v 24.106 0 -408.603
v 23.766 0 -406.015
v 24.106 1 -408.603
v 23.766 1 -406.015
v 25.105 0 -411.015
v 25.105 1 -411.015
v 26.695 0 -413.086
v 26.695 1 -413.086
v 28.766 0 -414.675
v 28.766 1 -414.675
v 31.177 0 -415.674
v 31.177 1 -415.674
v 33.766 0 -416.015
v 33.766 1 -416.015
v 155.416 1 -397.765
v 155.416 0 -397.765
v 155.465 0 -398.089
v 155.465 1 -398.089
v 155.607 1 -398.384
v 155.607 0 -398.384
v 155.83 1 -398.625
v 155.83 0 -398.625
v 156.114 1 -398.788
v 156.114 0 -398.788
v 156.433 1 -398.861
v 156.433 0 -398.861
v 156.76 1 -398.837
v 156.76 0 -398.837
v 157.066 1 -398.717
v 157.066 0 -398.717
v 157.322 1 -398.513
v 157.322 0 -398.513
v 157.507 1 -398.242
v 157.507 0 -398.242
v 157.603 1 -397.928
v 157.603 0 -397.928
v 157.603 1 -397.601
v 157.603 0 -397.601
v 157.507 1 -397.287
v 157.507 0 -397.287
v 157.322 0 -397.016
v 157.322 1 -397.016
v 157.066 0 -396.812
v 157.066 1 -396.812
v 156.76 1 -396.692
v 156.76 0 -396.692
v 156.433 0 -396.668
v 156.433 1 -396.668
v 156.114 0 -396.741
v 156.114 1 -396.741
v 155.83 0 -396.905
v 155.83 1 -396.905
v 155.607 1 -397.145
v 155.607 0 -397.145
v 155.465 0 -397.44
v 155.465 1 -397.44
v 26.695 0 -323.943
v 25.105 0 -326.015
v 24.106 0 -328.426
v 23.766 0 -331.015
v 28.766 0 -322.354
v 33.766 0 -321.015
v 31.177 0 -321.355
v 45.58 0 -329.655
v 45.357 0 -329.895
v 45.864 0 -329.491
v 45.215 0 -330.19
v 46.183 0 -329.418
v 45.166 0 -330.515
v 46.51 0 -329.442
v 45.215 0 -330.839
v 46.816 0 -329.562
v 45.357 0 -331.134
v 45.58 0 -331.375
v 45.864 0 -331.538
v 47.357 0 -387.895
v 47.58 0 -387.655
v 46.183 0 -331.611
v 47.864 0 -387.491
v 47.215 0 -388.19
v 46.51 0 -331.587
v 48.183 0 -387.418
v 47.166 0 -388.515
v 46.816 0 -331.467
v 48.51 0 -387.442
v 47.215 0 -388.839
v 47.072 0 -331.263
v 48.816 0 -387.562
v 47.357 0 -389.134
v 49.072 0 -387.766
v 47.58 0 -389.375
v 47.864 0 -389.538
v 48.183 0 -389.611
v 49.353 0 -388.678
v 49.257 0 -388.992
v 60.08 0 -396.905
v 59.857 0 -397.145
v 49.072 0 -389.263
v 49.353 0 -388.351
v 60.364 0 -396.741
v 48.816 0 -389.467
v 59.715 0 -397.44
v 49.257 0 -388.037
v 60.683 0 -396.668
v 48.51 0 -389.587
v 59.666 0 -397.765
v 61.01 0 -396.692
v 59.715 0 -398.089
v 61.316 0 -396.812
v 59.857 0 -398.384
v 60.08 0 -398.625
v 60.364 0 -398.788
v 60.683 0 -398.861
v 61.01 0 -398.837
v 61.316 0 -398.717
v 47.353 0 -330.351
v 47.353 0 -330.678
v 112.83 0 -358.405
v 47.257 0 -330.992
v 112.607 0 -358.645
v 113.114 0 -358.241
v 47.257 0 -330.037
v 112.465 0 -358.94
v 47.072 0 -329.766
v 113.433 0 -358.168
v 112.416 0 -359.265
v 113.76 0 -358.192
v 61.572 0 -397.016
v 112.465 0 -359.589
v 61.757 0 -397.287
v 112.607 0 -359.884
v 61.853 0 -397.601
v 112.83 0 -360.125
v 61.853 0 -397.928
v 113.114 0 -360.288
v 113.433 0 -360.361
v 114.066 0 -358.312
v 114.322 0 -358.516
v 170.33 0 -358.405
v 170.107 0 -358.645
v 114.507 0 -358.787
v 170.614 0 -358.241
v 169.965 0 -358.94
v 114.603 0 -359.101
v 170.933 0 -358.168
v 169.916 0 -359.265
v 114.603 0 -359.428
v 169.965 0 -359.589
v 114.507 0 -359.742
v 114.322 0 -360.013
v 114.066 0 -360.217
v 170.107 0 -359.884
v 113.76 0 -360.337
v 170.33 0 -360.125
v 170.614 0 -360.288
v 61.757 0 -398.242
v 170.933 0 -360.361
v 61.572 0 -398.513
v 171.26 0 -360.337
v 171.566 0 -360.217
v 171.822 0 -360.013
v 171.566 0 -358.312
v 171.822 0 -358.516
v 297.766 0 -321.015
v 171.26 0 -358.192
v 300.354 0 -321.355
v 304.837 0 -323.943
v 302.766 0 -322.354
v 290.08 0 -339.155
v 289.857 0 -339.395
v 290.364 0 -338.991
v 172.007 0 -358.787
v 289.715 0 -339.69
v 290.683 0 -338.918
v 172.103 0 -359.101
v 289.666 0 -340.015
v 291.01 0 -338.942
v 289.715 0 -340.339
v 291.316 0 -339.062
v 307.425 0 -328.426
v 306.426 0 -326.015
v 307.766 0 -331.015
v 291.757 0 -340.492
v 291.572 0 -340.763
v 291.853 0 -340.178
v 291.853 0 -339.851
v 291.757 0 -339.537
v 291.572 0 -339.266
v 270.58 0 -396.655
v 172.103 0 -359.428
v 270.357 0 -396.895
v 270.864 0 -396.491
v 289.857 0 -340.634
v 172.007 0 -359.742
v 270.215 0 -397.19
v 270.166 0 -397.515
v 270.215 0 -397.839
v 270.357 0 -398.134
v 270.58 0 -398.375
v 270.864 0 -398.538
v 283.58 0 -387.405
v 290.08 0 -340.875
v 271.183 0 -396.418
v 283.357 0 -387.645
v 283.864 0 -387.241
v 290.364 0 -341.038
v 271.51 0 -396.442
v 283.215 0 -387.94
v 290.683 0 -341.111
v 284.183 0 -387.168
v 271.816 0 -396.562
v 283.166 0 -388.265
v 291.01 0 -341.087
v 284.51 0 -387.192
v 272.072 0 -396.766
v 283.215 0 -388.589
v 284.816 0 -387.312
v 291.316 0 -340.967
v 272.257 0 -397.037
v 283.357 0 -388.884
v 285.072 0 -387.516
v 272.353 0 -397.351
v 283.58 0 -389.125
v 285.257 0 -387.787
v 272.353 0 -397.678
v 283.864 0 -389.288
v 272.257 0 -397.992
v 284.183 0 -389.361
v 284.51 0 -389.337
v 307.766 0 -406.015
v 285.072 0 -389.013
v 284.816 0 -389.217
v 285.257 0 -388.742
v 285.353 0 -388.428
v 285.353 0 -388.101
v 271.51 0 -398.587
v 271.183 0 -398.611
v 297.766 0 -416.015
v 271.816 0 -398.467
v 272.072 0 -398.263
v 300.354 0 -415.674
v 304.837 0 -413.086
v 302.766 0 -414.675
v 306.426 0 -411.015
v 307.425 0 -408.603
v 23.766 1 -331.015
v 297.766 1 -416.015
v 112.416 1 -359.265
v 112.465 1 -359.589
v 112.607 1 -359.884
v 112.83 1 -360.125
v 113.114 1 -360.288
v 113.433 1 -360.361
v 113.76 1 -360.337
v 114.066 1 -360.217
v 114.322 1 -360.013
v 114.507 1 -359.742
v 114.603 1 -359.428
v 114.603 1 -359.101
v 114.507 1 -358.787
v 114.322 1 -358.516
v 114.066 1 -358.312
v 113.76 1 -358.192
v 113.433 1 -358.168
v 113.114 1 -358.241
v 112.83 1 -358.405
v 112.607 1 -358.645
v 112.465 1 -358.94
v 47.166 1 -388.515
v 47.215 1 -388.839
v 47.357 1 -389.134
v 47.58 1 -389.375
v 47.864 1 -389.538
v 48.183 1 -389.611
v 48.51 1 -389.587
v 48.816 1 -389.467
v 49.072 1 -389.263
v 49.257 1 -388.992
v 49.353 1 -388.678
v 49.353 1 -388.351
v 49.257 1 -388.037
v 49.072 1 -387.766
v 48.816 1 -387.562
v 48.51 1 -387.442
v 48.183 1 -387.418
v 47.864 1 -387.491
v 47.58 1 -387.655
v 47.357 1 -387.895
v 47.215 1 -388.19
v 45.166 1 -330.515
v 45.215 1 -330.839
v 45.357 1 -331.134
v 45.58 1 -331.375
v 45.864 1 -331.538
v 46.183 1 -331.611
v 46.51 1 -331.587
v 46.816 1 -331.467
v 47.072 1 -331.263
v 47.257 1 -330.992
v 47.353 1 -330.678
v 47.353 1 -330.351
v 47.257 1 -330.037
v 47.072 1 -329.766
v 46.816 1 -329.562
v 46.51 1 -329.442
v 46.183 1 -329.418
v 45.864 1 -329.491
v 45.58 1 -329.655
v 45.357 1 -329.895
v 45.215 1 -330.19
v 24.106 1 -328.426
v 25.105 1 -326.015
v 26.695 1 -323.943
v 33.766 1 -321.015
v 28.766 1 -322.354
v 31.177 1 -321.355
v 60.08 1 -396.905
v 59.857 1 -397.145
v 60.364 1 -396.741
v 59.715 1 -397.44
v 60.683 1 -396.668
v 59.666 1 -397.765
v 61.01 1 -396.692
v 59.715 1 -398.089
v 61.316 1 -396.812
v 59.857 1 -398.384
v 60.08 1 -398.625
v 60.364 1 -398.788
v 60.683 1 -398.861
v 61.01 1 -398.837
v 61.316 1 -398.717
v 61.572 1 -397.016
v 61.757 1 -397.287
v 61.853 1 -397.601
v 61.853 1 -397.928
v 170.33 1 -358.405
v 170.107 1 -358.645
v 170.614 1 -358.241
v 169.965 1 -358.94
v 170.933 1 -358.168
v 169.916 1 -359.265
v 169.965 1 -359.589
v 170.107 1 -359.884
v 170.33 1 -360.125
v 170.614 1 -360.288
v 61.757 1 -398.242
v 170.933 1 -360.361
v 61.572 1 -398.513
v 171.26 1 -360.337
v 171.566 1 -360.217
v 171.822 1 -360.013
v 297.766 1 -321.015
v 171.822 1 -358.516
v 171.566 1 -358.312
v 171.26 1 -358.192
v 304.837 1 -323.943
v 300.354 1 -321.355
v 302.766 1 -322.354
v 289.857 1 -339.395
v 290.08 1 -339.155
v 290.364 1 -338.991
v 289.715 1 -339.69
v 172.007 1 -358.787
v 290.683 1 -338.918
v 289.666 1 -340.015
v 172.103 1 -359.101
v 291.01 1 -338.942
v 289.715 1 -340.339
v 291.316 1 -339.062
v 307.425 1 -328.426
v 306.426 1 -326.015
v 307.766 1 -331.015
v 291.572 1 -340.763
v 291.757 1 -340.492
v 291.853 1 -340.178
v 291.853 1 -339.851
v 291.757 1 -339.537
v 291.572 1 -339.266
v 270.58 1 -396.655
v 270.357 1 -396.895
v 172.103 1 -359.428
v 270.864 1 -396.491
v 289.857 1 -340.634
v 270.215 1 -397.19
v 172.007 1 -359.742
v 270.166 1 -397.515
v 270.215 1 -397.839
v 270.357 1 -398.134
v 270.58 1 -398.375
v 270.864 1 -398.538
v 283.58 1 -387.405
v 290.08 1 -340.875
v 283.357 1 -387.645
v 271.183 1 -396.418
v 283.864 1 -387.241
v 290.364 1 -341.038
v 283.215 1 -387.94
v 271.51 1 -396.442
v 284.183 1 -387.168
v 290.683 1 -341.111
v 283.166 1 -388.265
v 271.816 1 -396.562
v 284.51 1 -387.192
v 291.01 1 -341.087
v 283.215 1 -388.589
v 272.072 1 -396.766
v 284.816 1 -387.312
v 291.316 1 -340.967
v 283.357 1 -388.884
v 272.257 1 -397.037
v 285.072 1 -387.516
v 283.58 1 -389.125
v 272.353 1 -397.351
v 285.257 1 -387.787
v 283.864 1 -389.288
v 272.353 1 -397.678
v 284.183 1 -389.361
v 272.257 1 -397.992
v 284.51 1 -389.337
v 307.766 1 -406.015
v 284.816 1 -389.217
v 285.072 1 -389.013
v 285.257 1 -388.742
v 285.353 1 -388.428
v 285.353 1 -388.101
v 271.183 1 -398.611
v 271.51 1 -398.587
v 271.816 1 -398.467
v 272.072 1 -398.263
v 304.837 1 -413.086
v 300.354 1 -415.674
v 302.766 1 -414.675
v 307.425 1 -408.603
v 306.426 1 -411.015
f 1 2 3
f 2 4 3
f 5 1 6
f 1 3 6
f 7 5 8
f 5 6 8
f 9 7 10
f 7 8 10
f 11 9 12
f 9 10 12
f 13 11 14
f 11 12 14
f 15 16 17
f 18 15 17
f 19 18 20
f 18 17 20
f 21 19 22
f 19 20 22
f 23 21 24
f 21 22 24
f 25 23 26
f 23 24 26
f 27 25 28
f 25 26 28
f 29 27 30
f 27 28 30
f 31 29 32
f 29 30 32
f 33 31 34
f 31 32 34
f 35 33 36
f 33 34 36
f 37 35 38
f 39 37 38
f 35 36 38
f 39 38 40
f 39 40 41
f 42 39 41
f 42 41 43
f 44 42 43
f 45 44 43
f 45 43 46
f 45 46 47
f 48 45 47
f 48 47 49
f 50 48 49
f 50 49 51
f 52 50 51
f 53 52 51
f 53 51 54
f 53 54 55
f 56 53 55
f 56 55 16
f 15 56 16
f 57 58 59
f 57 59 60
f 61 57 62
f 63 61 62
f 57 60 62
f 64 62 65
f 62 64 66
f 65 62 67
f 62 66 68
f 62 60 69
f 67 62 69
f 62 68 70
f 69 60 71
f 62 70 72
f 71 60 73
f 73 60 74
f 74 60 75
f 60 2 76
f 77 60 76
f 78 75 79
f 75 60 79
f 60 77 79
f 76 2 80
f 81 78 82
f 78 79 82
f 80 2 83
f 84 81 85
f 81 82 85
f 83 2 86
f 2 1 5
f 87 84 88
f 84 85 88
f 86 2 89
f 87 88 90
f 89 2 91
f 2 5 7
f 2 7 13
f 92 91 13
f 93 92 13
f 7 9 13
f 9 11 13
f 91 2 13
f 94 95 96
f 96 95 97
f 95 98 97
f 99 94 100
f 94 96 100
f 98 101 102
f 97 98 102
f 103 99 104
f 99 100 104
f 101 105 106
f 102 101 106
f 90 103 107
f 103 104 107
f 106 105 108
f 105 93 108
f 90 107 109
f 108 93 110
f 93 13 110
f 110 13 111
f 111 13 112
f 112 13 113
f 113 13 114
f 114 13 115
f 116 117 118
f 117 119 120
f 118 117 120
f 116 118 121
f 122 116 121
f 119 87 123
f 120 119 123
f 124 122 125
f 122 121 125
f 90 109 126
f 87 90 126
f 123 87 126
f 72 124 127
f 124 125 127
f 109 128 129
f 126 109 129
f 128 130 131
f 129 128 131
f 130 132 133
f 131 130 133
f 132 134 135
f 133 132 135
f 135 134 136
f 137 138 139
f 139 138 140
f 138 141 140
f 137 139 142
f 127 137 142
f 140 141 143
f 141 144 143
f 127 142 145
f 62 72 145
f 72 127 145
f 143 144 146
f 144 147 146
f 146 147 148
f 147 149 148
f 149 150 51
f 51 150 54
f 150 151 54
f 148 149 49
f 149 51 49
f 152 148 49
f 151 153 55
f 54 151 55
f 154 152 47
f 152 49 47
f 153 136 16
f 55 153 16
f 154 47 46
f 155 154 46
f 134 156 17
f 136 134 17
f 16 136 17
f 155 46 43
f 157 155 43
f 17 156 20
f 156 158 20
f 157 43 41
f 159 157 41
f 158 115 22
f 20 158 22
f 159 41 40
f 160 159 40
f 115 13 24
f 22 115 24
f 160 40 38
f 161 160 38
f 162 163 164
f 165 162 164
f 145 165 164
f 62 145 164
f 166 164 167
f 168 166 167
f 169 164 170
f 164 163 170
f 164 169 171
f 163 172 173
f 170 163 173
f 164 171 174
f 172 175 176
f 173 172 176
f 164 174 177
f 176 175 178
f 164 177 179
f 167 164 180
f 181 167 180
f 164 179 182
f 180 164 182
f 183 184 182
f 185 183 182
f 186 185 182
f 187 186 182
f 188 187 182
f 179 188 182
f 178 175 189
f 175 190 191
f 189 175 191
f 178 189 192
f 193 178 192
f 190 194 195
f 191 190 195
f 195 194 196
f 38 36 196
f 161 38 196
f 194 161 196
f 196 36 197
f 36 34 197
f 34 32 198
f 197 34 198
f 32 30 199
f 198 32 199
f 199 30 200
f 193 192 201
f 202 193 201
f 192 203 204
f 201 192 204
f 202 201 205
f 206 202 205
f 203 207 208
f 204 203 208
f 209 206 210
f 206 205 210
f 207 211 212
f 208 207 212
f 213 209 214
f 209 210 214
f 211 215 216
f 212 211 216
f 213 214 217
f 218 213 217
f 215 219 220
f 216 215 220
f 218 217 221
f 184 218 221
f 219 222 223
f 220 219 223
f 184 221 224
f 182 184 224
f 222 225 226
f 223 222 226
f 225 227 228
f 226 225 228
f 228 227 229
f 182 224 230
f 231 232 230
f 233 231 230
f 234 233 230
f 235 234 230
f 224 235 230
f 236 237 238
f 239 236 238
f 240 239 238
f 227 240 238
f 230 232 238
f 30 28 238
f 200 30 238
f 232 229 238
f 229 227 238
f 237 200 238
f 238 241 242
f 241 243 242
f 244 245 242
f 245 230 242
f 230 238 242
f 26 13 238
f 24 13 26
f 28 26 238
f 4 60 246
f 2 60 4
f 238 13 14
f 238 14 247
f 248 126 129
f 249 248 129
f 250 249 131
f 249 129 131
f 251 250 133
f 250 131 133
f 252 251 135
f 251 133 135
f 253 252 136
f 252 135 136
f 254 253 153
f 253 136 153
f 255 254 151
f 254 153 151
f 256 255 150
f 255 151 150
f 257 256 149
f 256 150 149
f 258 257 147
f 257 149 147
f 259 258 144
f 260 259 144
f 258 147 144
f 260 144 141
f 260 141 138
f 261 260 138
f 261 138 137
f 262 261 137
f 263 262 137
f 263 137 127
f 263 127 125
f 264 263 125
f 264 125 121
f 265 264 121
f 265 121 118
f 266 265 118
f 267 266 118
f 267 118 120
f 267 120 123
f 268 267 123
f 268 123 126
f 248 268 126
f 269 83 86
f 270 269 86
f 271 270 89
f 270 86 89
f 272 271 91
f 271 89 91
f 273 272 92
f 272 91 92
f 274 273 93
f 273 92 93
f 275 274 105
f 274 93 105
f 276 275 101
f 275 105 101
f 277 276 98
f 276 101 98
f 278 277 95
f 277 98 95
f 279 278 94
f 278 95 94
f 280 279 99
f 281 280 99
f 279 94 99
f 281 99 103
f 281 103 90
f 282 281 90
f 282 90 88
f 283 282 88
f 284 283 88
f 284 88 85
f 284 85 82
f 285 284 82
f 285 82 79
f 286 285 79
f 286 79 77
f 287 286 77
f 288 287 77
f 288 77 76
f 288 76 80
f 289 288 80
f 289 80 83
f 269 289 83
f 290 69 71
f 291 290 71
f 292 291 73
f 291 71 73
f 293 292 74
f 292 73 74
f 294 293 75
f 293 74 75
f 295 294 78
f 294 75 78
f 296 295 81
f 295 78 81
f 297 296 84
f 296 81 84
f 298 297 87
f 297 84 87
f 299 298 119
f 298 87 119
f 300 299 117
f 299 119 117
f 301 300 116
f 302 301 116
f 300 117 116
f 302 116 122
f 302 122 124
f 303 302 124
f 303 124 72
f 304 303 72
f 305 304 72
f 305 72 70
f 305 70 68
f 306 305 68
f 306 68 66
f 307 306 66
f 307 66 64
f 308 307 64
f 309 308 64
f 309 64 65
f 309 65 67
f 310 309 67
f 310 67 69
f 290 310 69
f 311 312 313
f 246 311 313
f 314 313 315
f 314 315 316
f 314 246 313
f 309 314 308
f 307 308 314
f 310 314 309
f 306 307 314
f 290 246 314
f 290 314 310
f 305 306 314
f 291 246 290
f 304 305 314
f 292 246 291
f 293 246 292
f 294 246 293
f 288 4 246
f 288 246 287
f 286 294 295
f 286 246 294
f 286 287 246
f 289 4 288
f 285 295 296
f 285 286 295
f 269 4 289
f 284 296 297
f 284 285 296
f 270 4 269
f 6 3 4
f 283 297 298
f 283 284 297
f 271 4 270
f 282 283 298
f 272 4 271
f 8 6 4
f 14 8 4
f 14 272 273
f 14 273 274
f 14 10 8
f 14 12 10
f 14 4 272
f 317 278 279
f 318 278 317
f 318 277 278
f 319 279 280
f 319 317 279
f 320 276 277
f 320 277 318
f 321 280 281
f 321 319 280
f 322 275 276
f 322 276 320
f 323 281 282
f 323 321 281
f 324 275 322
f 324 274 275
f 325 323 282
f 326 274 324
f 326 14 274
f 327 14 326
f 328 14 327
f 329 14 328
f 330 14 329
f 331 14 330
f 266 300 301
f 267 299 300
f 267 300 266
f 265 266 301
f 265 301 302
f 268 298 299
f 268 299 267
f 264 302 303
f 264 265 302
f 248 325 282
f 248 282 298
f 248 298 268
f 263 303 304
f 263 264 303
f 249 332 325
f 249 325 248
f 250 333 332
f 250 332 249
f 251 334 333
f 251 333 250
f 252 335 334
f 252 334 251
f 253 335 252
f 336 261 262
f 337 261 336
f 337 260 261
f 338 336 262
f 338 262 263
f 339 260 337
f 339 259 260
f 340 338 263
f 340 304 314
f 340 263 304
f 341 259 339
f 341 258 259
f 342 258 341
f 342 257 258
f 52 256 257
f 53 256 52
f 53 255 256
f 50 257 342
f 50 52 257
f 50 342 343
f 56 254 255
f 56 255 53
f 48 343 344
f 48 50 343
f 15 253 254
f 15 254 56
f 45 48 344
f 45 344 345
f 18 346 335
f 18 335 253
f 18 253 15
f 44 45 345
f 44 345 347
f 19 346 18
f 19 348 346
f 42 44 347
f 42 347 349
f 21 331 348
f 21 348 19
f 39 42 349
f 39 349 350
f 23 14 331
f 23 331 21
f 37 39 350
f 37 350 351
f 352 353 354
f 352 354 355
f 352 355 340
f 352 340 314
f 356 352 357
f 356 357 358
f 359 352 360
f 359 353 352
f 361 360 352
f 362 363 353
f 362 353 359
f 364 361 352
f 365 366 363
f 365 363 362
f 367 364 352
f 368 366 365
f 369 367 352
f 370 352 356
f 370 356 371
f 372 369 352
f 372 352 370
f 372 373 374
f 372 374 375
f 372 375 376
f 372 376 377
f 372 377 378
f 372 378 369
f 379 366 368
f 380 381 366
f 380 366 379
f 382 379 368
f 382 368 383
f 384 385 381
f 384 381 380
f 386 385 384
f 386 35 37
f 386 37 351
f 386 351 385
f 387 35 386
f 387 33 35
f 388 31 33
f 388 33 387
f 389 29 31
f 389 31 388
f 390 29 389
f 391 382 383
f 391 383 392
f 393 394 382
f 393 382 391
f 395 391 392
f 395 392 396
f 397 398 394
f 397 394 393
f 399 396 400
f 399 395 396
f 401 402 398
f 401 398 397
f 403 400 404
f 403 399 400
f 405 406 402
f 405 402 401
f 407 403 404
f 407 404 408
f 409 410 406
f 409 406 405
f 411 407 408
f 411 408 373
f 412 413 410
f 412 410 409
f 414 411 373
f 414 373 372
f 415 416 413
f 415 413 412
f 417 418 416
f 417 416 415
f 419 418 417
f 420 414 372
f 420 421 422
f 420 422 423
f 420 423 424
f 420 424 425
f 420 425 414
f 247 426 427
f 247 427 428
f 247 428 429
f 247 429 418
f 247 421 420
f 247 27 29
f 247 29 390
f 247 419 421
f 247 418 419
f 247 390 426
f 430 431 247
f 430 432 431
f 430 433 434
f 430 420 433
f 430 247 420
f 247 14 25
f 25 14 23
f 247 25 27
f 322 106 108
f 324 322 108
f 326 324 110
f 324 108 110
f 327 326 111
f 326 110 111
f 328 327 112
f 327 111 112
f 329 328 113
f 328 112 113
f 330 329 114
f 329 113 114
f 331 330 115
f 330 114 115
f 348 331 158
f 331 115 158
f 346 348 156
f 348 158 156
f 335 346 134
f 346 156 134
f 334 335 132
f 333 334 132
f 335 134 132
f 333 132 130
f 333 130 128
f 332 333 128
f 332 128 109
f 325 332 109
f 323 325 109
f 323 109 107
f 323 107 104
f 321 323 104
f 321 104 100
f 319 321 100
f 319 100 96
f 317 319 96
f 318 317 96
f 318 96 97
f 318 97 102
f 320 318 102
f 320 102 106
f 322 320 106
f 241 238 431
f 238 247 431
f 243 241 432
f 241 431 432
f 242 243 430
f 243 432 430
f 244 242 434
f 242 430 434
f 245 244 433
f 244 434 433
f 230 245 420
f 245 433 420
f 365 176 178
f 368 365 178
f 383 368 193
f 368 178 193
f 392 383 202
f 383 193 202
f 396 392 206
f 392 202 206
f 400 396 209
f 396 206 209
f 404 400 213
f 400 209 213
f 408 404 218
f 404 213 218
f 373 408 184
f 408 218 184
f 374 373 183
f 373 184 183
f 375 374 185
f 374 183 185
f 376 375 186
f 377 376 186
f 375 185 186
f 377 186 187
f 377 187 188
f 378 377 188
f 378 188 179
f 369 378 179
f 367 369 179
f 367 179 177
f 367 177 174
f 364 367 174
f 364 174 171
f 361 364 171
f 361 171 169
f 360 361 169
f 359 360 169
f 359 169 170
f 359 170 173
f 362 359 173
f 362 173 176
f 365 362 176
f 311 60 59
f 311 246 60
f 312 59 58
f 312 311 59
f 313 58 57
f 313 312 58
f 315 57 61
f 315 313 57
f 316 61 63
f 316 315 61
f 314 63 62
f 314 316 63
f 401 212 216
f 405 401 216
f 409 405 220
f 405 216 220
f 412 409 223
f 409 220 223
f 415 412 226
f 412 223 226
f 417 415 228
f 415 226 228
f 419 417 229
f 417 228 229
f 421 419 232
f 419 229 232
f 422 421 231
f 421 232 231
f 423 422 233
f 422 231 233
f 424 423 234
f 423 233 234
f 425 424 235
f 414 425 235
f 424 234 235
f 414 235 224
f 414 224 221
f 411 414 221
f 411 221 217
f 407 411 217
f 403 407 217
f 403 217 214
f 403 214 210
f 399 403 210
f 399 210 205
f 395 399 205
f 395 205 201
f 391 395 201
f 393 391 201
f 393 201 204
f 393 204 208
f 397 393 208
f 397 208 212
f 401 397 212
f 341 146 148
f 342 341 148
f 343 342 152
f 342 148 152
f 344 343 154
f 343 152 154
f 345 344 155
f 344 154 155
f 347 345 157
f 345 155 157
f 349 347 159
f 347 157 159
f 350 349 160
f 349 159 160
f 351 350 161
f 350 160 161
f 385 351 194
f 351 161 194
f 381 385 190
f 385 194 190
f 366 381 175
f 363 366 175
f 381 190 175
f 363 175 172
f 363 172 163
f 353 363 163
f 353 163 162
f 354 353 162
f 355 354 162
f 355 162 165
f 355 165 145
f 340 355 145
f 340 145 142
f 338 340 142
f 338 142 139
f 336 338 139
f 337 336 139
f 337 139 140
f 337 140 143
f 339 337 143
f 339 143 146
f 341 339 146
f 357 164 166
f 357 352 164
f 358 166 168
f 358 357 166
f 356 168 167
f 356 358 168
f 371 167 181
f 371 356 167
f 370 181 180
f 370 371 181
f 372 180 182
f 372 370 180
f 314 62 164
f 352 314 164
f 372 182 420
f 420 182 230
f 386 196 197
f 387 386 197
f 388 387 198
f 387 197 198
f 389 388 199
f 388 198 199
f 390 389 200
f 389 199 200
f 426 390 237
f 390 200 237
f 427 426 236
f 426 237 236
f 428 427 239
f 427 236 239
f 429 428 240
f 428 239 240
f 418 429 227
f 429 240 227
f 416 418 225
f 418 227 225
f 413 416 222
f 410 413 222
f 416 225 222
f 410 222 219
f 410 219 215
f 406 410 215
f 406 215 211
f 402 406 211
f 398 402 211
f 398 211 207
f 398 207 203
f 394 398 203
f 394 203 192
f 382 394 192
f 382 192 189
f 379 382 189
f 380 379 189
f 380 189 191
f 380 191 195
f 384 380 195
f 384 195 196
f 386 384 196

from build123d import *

# Parameters (mm, degrees)
SKETCH3_W             = 284
SKETCH3_H             = 95
BOSS_EXTRUDE1_DEPTH   = 1
F_2_0MM_DOWEL_HOLE1_D = 2.2
FILLET1_R             = 10


with BuildPart() as part:
    # Sketch3 → Boss-Extrude1 (new body)
    with BuildSketch(Plane(origin=(0, 0, 0), x_dir=(1, 0, 0), z_dir=(0, 1, 0))):
        with Locations((165.765656923, 368.514519522)):
            Rectangle(SKETCH3_W, SKETCH3_H)
    extrude(amount=BOSS_EXTRUDE1_DEPTH)

    # Ø2.0mm Dowel Hole1 (through all)
    with Locations(Plane(origin=(0, 1, 0), x_dir=(1, 0, 0), z_dir=(0, 1, 0))):
        with Locations((48.265656923, 388.514519522), (60.765656923, 397.764519522), (46.265656923, 330.514519522), (113.515656923, 359.264519522), (156.515656923, 397.764519522), (171.015656923, 359.264519522), (271.265656923, 397.514519522), (284.265656923, 388.264519522), (290.765656923, 340.014519522)):
            Hole(F_2_0MM_DOWEL_HOLE1_D / 2)

    # Fillet1
    fillet1_edges = [part.edges().sort_by_distance(p)[0] for p in [
        (23.765656923, 0.5, -416.014519522),
        (307.765656923, 0.5, -416.014519522),
        (307.765656923, 0.5, -321.014519522),
        (23.765656923, 0.5, -321.014519522),
    ]]
    fillet(fillet1_edges, radius=FILLET1_R)


solid = part.part
